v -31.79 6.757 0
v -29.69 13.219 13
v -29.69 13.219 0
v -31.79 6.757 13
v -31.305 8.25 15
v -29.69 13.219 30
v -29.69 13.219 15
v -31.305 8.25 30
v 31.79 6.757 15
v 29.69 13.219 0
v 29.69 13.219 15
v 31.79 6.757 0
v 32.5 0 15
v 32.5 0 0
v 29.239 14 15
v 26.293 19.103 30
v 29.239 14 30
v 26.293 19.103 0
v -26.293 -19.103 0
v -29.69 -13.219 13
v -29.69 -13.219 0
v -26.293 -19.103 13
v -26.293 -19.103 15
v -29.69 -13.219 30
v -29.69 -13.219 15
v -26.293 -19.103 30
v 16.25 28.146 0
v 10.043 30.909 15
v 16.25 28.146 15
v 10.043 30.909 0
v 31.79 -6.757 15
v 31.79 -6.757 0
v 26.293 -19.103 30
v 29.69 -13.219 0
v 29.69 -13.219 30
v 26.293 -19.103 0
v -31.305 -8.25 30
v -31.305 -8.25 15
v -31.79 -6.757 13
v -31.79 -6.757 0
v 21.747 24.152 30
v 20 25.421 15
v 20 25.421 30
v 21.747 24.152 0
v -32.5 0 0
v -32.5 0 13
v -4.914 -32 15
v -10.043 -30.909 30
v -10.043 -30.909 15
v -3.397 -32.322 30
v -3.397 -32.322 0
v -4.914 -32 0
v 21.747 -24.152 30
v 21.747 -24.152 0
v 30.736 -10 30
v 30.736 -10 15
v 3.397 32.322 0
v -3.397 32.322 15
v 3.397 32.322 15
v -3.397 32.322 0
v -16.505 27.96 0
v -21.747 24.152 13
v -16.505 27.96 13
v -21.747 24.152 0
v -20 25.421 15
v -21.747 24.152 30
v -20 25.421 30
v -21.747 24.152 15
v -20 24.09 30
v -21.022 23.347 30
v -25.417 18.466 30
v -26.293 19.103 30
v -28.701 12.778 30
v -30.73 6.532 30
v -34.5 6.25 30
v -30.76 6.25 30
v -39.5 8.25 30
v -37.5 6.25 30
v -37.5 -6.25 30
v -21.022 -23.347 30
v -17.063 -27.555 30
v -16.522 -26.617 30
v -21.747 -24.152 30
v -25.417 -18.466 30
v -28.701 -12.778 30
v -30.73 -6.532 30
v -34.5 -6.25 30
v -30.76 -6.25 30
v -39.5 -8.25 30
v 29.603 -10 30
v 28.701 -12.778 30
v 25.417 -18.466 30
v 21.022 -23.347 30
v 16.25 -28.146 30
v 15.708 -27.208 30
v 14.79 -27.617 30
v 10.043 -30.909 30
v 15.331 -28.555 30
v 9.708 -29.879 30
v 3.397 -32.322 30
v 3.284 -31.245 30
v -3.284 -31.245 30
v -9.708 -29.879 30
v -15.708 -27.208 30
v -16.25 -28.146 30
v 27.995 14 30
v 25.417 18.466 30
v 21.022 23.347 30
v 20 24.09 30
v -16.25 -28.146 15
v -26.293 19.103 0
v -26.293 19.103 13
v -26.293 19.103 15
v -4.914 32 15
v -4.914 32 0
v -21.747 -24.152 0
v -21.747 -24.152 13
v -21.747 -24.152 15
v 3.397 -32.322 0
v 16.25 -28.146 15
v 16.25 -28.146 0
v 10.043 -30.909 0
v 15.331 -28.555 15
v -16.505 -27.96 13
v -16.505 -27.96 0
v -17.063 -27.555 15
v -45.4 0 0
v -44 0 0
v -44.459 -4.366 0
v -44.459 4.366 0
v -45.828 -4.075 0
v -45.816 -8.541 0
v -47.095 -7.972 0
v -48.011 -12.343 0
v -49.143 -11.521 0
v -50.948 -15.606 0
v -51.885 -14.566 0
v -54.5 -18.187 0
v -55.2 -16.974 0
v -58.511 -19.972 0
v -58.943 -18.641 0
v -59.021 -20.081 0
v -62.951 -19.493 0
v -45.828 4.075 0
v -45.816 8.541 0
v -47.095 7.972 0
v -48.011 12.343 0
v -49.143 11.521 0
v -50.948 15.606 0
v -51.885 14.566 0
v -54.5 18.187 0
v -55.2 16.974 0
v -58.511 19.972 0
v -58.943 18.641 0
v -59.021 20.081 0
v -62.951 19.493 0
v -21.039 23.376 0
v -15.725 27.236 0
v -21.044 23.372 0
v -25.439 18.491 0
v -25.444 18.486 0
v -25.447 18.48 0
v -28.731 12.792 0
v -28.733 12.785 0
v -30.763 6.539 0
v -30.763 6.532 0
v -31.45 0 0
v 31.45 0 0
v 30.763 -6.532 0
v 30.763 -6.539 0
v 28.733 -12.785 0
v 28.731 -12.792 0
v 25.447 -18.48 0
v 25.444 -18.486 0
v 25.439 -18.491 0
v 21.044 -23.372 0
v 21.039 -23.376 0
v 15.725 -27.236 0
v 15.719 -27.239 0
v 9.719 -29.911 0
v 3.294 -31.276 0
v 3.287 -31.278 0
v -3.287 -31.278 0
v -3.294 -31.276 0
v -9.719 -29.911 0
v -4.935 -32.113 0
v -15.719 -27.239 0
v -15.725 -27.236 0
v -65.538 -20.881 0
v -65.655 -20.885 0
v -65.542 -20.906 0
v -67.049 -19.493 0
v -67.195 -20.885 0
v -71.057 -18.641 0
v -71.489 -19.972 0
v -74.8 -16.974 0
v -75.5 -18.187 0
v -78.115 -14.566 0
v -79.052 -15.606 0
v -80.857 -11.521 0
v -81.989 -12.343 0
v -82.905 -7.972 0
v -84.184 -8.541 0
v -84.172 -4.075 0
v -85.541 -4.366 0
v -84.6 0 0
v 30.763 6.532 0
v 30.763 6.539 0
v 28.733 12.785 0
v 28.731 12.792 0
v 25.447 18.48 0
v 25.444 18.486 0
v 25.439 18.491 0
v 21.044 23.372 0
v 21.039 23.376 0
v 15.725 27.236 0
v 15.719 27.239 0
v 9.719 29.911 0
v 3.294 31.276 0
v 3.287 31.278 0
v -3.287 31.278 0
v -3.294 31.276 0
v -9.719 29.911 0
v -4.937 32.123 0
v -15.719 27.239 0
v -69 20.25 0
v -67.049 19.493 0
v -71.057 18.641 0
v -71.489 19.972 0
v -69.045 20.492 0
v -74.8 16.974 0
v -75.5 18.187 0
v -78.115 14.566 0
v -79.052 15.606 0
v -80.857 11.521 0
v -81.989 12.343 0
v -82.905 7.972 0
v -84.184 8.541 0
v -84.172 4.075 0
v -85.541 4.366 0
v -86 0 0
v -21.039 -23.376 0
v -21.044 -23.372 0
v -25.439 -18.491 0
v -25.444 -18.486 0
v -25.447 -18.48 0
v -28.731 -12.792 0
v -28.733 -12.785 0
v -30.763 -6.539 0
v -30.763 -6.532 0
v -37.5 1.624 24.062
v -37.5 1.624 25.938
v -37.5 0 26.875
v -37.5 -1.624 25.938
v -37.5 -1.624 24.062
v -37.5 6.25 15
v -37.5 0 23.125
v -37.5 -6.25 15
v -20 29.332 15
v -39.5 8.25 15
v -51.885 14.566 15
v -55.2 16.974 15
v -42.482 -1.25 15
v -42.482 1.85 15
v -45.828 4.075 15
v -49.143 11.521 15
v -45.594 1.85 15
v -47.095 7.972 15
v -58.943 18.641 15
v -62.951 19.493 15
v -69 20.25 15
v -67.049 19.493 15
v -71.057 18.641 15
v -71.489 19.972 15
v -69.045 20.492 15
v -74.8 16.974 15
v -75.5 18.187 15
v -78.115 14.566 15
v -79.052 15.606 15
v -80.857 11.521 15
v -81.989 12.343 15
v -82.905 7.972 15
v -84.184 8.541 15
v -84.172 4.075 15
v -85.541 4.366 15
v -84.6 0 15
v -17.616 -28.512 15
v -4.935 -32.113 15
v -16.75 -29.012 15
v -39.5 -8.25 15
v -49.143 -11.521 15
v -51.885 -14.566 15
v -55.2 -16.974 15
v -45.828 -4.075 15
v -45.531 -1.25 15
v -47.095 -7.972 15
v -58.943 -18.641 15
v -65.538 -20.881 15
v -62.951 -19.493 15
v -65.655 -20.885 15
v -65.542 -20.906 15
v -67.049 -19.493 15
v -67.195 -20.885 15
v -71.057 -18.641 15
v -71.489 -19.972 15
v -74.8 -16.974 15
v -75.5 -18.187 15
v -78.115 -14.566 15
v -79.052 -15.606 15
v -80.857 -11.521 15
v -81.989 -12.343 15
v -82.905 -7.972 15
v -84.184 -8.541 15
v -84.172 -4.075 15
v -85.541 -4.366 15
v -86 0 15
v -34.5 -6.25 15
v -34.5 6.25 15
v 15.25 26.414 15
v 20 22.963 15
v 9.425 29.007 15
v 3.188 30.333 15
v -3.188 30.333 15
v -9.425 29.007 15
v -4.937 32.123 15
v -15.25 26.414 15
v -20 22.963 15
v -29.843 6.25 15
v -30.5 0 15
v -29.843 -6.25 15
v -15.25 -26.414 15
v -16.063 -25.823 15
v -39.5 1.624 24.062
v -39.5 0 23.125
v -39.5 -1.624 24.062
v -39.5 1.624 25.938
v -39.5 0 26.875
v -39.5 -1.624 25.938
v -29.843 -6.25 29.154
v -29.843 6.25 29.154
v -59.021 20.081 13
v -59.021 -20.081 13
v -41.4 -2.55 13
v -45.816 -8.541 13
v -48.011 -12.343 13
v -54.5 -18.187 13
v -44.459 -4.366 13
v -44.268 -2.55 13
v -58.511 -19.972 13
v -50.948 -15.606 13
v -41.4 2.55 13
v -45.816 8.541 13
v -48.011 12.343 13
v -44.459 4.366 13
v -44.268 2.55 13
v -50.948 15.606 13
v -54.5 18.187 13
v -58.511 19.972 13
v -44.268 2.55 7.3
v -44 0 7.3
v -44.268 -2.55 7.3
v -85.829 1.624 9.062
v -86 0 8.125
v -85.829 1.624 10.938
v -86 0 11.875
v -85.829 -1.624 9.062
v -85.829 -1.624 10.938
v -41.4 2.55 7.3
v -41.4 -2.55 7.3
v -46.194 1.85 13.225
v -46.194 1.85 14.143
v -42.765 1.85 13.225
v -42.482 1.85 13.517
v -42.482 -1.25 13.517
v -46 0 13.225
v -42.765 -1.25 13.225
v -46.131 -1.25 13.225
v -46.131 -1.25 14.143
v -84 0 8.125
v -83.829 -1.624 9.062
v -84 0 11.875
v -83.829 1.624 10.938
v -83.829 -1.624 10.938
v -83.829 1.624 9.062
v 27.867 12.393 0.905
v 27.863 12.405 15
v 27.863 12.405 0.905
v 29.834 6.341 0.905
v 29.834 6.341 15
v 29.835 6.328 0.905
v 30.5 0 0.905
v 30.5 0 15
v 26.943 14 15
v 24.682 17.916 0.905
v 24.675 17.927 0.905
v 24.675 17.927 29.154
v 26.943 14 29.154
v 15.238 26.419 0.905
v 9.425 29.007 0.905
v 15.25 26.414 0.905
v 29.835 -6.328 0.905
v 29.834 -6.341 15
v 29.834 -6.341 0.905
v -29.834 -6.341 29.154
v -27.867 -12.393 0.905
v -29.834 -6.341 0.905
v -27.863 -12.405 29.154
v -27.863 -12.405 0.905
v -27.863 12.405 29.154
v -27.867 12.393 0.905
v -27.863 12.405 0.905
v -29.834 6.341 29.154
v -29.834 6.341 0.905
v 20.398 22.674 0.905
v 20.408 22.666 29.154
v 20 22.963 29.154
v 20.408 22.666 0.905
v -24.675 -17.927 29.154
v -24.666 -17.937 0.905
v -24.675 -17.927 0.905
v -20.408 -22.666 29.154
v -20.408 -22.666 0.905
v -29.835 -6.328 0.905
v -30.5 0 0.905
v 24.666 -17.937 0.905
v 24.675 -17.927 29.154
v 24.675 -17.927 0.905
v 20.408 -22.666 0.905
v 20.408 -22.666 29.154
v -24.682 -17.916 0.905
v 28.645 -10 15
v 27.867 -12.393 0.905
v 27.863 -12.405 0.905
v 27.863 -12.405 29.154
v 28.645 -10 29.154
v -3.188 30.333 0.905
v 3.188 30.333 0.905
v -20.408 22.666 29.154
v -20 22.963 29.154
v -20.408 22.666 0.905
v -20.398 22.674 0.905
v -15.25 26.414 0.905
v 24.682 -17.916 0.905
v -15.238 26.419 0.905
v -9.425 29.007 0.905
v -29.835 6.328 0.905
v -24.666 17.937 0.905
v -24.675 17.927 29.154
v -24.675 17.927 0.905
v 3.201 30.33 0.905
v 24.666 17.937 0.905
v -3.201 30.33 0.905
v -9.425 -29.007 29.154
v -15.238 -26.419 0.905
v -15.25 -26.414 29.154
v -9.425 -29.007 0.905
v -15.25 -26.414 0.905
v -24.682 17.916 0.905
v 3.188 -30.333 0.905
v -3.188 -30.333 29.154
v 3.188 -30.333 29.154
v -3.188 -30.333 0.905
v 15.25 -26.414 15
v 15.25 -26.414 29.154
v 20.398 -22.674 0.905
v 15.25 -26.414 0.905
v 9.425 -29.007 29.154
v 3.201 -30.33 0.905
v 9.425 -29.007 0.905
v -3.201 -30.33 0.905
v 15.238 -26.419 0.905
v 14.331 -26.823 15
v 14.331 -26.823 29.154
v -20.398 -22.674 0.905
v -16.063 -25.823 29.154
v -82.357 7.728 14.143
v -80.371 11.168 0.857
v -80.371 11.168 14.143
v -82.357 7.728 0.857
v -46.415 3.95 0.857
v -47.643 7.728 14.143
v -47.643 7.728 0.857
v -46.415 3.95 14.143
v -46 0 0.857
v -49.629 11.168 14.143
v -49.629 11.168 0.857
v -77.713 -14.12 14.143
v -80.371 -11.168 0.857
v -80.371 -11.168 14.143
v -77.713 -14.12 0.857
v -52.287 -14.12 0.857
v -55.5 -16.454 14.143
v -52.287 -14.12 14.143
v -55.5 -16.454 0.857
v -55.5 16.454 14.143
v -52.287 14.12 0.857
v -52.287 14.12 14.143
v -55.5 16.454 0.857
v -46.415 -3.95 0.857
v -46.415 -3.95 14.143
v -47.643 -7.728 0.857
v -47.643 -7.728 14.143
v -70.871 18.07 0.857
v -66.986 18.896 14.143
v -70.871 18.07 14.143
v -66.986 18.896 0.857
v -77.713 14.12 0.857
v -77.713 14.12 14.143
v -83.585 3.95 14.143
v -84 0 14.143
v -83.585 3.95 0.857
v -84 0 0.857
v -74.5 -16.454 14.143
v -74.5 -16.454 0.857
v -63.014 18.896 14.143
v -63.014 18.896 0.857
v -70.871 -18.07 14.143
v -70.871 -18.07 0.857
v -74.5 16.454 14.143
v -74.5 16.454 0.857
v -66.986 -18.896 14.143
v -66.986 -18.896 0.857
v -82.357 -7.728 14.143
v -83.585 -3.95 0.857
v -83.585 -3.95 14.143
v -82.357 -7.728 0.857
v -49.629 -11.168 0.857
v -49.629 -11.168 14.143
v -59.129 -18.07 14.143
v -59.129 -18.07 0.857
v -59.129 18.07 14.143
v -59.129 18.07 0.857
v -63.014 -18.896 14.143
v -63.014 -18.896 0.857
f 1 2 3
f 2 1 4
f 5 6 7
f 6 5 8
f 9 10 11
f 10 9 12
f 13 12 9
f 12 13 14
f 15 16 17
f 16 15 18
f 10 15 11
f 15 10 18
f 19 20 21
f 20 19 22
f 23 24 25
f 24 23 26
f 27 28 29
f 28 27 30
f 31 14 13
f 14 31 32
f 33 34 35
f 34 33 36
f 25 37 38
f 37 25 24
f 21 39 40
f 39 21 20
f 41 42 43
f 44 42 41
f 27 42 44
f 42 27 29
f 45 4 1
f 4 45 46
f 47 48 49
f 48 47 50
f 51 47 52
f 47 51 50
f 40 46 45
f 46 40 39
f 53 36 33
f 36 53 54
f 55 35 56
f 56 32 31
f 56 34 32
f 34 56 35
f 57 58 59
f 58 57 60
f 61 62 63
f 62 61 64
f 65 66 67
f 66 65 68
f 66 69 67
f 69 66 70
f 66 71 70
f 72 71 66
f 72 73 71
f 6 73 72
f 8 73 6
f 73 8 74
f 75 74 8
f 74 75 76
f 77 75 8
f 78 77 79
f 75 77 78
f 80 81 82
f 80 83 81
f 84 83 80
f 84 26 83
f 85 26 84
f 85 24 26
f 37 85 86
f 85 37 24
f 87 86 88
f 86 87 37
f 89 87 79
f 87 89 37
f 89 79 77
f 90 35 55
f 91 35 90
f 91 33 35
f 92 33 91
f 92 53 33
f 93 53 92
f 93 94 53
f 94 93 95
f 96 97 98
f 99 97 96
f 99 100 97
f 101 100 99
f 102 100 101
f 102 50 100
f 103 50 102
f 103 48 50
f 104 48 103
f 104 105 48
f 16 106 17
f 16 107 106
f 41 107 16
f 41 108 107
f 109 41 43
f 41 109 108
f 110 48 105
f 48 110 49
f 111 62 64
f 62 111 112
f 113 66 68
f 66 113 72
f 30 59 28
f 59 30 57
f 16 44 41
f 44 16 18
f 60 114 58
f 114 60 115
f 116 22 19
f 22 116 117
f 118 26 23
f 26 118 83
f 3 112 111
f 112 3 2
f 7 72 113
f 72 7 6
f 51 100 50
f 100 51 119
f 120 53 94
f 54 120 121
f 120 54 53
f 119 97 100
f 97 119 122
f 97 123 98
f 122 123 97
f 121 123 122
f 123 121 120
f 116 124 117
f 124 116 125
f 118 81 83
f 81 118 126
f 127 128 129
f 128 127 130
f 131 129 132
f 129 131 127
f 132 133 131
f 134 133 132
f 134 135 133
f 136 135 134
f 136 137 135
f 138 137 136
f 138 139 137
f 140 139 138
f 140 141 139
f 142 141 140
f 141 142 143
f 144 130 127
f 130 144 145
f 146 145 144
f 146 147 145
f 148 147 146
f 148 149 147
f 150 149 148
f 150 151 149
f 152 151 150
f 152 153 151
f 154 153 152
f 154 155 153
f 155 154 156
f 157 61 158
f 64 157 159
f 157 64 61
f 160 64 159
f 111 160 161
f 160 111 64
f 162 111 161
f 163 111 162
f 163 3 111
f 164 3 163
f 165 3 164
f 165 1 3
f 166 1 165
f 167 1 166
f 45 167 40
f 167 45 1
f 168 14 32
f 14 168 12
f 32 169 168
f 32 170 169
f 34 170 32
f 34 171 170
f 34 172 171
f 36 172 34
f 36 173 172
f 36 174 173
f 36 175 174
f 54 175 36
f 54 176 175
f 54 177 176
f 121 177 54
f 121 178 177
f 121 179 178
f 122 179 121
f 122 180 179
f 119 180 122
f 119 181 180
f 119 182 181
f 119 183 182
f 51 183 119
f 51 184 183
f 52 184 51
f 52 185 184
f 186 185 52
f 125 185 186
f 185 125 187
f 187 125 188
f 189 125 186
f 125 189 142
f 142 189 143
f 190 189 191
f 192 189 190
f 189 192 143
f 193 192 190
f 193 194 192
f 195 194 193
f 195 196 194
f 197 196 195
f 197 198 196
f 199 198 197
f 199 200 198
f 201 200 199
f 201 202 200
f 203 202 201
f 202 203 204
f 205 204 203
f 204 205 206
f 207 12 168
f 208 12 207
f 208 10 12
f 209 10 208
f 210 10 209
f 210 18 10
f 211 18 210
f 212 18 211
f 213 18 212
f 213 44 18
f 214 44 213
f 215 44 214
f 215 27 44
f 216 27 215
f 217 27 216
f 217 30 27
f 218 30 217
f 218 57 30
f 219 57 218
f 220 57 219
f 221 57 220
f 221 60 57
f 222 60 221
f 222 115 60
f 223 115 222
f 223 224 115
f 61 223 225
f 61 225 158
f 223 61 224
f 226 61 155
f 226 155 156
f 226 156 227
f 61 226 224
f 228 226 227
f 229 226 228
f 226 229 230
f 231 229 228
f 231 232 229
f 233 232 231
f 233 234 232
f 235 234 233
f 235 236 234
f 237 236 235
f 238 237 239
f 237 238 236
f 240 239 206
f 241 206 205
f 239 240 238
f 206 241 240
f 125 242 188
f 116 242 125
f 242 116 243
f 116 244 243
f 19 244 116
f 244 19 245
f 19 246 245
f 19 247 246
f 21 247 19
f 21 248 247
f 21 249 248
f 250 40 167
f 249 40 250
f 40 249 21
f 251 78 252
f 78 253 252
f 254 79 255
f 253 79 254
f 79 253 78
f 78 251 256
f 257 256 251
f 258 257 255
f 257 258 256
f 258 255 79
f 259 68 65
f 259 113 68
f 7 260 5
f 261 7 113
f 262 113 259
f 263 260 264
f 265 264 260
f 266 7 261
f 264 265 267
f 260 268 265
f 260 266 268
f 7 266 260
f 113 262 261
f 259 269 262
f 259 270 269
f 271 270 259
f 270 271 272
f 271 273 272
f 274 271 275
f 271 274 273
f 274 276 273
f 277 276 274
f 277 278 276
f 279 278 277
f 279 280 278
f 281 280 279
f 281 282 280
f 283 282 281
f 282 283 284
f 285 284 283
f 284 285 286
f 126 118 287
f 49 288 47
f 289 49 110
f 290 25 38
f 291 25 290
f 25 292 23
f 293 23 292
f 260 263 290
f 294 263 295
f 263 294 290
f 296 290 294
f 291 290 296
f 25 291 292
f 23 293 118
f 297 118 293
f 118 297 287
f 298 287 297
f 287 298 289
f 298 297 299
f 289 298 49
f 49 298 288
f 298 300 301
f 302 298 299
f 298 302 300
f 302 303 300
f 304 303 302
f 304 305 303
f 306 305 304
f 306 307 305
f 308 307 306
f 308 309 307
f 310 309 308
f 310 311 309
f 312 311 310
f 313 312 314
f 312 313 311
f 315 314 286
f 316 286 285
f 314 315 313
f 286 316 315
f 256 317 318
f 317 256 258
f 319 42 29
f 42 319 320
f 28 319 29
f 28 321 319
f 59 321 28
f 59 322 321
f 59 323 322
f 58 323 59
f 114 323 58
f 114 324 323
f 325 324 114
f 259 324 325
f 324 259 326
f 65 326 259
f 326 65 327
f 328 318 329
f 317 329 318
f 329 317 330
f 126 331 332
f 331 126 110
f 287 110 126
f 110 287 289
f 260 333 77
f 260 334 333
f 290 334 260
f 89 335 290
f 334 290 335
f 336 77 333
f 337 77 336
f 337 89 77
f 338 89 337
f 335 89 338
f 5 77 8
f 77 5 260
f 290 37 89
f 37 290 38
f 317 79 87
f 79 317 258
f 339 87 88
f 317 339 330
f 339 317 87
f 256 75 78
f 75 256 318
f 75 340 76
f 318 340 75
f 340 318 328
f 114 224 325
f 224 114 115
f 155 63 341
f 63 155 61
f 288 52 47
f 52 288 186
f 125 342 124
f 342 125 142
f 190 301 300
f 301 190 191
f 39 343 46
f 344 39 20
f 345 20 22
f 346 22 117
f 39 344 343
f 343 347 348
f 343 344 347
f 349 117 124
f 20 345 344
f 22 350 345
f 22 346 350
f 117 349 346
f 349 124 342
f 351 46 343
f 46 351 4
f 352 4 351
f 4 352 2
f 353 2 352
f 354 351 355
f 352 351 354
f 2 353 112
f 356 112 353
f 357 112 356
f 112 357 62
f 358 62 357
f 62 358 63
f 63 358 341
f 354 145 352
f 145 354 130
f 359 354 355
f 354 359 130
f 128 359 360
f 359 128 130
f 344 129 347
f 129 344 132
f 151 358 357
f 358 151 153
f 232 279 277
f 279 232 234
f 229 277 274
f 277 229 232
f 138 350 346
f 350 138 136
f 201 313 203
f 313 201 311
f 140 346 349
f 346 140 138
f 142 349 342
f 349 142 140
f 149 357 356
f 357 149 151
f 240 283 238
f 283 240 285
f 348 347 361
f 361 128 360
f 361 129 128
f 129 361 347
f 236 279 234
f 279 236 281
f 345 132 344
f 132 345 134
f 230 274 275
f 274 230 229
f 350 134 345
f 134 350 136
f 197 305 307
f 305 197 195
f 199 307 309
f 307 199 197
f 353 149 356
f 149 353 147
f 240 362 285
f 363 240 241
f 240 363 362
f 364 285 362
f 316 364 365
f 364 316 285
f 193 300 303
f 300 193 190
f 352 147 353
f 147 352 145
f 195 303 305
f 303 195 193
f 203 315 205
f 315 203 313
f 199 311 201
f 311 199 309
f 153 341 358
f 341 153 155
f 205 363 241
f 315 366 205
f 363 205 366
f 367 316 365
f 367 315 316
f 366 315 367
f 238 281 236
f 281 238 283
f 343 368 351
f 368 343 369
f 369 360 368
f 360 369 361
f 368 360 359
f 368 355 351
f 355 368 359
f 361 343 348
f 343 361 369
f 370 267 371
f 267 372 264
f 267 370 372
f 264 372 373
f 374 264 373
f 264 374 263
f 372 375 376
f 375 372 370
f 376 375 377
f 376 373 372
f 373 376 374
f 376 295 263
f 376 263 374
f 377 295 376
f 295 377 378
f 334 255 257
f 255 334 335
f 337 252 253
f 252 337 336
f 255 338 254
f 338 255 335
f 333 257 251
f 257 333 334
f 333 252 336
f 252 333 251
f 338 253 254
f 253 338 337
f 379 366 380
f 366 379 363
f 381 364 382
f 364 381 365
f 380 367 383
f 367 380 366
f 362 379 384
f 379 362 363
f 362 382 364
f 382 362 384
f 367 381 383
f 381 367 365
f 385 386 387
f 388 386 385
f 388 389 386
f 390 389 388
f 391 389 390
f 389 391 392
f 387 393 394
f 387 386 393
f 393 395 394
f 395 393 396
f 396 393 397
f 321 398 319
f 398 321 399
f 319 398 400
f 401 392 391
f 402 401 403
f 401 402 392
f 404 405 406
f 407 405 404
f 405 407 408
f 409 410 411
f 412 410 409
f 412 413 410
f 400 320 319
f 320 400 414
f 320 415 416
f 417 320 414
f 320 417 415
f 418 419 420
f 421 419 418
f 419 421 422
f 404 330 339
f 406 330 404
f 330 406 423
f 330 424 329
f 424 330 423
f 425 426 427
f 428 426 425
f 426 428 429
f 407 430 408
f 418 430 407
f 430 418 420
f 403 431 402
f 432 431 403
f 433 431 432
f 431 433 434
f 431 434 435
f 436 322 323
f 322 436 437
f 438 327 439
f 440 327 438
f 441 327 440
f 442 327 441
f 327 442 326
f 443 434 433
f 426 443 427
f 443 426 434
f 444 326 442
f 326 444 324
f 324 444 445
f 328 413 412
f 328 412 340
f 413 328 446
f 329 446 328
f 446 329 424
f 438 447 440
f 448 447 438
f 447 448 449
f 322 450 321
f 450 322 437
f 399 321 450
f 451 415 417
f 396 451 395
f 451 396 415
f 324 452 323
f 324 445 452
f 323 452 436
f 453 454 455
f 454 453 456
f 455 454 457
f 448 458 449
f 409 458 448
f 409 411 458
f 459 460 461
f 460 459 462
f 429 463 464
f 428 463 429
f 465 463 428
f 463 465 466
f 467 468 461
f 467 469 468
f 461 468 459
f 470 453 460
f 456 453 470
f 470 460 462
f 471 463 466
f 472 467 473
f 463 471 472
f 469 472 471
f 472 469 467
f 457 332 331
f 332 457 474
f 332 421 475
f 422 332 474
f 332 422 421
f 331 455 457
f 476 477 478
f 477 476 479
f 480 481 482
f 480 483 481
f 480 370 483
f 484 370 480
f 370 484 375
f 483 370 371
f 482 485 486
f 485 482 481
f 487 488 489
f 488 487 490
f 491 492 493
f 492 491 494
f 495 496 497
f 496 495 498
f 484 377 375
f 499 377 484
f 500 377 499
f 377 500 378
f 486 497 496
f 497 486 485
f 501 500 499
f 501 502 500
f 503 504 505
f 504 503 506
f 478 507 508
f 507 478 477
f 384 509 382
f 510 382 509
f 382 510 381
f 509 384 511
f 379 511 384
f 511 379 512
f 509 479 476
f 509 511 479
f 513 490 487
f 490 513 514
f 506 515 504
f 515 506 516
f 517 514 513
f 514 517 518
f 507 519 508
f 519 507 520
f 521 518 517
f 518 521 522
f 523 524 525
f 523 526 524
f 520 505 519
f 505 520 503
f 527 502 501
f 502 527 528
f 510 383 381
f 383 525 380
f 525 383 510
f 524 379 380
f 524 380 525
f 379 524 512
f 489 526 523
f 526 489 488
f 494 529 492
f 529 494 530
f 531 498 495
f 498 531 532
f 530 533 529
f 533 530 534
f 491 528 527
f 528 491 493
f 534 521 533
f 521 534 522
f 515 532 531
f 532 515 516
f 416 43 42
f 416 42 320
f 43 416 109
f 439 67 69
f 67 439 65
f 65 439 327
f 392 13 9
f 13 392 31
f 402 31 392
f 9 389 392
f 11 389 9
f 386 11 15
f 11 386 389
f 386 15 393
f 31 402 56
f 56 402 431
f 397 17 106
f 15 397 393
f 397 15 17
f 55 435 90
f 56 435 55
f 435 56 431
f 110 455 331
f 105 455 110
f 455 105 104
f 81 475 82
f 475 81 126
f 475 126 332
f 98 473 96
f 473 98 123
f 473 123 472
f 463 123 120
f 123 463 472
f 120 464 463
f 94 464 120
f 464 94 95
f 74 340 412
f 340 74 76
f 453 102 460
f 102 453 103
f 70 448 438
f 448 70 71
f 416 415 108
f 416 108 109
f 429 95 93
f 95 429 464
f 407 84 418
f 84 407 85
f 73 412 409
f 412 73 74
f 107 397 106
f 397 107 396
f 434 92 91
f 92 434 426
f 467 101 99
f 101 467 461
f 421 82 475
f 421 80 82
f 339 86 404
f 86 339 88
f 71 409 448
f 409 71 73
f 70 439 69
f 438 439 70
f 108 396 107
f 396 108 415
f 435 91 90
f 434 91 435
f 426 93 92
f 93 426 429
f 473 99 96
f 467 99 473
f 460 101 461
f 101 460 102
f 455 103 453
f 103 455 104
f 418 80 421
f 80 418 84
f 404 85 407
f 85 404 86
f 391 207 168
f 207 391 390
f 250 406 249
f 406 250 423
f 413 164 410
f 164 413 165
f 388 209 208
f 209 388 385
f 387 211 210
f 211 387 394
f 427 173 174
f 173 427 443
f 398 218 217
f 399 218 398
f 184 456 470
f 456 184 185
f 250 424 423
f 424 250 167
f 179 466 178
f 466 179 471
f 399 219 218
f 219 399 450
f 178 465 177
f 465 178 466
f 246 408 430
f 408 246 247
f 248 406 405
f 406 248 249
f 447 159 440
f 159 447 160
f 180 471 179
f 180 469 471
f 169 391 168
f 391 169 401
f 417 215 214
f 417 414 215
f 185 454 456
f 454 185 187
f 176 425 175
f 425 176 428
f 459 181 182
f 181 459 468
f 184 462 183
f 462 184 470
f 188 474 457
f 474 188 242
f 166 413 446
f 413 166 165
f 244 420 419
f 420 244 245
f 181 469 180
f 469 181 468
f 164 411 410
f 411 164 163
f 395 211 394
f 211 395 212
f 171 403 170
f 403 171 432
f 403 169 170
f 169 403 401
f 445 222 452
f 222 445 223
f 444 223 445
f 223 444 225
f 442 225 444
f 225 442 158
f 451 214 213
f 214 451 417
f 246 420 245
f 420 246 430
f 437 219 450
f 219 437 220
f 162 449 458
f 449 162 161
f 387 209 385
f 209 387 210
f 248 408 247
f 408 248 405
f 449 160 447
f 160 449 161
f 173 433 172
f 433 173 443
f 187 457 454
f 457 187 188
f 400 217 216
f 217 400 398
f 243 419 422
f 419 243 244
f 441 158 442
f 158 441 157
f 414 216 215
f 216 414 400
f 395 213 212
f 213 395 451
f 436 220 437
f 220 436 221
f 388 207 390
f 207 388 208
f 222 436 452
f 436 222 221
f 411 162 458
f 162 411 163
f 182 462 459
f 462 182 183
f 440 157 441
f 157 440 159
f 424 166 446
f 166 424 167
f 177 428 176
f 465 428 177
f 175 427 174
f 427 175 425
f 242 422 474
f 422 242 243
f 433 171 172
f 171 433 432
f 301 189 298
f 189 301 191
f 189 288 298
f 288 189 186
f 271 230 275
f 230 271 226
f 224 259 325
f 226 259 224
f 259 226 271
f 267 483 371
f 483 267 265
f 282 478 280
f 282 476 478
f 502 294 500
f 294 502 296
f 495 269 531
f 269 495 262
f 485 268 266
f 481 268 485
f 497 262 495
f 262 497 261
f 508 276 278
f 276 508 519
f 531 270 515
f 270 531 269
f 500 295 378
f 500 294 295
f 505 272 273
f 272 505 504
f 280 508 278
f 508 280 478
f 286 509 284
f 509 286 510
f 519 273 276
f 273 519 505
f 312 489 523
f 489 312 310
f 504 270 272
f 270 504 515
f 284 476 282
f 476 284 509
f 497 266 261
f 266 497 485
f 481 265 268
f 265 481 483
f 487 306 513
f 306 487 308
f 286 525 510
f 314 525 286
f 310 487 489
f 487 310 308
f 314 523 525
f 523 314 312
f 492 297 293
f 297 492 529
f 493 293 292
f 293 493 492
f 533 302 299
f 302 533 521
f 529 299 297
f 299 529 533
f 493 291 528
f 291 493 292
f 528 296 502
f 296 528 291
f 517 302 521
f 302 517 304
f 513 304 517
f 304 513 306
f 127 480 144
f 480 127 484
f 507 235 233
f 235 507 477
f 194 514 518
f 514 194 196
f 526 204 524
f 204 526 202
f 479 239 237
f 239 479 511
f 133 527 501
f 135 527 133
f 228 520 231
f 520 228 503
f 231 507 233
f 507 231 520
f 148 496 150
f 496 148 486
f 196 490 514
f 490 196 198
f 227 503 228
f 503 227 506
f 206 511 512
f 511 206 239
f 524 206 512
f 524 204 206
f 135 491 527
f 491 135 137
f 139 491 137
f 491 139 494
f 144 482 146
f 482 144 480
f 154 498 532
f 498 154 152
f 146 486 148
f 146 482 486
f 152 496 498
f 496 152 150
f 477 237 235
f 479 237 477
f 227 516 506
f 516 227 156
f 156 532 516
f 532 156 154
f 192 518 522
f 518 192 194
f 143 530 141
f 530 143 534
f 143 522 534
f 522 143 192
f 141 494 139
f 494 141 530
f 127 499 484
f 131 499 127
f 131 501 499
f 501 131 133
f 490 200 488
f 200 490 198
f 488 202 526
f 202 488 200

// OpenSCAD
// file: geometry.scad
function distance(xy0, xy1) = sqrt(pow((xy1[0] - xy0[0]), 2)
                                   + pow((xy1[1] - xy1[1]), 2));
function center(xy0, xy1) = [(xy1[0]+xy0[0])/2, (xy1[1]+xy0[1])/2];
// file: notcher.scad
module tube(h, r, t) {
    difference() {
        cylinder(h=h, r=r);
        cylinder(h=h, r=r-t);
    }
}

module notcher(w, d, h) {
    scale([4/5,1,3/5]) {
        translate([-w,+h/2,-d]) {
	    rotate([90,0,0]) {
		difference() {
		    union() {
			minkowski() {
			    cube([w,h,d/2]);
			    translate([w/9,w/9,0]) cylinder(h=d/2, r=w/9);
			}
			translate([w,h+w/9,0]) cube([w*3/9,w/9,d]);
			translate([-w/9,h+w/9,0]) cube([w*3/9,w/9,d]);
		    }
		    translate([-w/9,h+w/9,0]) cylinder(h=d, r=w/9);
		    translate([w+w*3/9,h+w/9,0]) cylinder(h=d, r=w/9);
		}
	    }
        }
    }
}
// main file
mount_center=0;
mount_diameter=61;
mount_radius=mount_diameter/2;
thickness=2;
height=30;
mount_width=12.5;
mount_depth=7;

screw_hole_radius=3.75/2;

vacuum_diameter=38;
vacuum_radius=vacuum_diameter/2;
vacuum_center=65;

far_mount_peak = [0+thickness/2, mount_radius + thickness/2];
far_vacuum_peak = [-vacuum_center-thickness/2,
                   vacuum_radius + thickness/2];
near_mount_peak = [0+thickness/2, -(mount_radius + thickness/2)];
near_vacuum_peak = [-vacuum_center-thickness/2,
                    -(vacuum_radius + thickness/2)];
registration_x = 4.6;
registration_y = 3.1;
registration_z = 3.7;

include <notcher.scad>
include <geometry.scad>

difference() {
    union() {
        // big cylindar
        cylinder(height, r=mount_radius+thickness);
        // build our screw plate
        translate([-(mount_radius+mount_depth+thickness),
                   -(mount_width+(thickness*2))/2,
                      height/2])
            cube([thickness, mount_width+(thickness*2),
                  height/2]);
        // and the near wall
        translate([-(mount_radius+mount_depth+thickness),
                   -(mount_width/2)-thickness,
                   height/2])
            cube([mount_depth+thickness*2, thickness,
                  height/2]);
        // and the far wall
        translate([-(mount_radius+mount_depth+thickness),
                   (mount_width/2),
                   height/2])
            cube([mount_depth+thickness*2, thickness,
                  height/2]);
        // put some walls on it to hang the curtain from
        d = distance(far_mount_peak, far_vacuum_peak);
        c = center(far_mount_peak, far_vacuum_peak);
        rotate([0,0,mount_radius - vacuum_radius - thickness/2])
            translate([(far_vacuum_peak[0]+far_mount_peak[0])/2
                        -d/2, mount_radius, 0])
                cube([d,thickness,height/2]);

        d = distance(near_mount_peak, near_vacuum_peak);
        c = center(near_mount_peak, near_vacuum_peak);
        rotate([0,0,-(mount_radius-vacuum_radius-thickness/2)])
            translate([(near_vacuum_peak[0]
                        +near_mount_peak[0])/2-d/2,
                       -(mount_radius+thickness),0])
                cube([d,thickness,height/2]);

        // and a floor...
        translate([-vacuum_center,-mount_radius,
                   height/2-thickness])
            cube([vacuum_center,mount_diameter,thickness]);
        // make the vacuum hose mount
        translate([-vacuum_center, 0, 0])
            cylinder(height/2, r=vacuum_radius+thickness);
        // hide the back of our vacuum registration
        translate([-(vacuum_center-vacuum_radius),
                   -(registration_y/2+thickness/2),
                   height/2-registration_z-thickness*2])
            cube([registration_x,
                  registration_y+thickness,
                  registration_z+thickness]);
    }
    // put a screw hole starter in our screw plate
    #translate([-(mount_radius+mount_depth+thickness+1),
               0, height/2+10])
        rotate([0,90,0])
            cylinder(thickness+2, r=screw_hole_radius);

    // put a screw hole starter in our vacuum ring
    #translate([-(vacuum_center+vacuum_radius+thickness+1), 0, 10])
        rotate([0,90,0])
            cylinder(thickness+2, r=screw_hole_radius);
    // now cut our big holes
    translate([0,0,-height/2])
        cylinder(height*2, r=mount_radius);
    translate([-vacuum_center,0,-height/4])
        cylinder(height, r=vacuum_radius);

    // cut out where our main spindle support structure is
    #translate([-20, mount_radius-10, height/2])
        cube([40, 20, height]);
    // cut out our spindle mount clamp screw rail
    #translate([mount_radius-7, -10, height/2])
        cube([20, 24, height]);
    // cut out our mounting rail
    #translate([-(mount_radius+thickness*2),
               -(mount_width/2), height/2])
        cube([8, mount_width, height]);
    // add some cutouts to ease mounting
    #rotate(a=[0,0,-30]) {
        translate([-thickness/2,
                   -(mount_radius+thickness*3/2),
                   height/2])
            cube([1,thickness*2,height/2]);
    }
    #rotate(a=[0,0,30]) {
        translate([-thickness/2,
                   -(mount_radius+thickness*3/2),
                   height/2])
            cube([1,thickness*2,height/2]);
    }
    // also bevel the edges of the mounting hole
    #translate([0,0,thickness/2])
        cylinder(h=height, r=mount_radius+thickness, r1=0);
    translate([0,0,-thickness/2])
        cylinder(h=height, r0=0, r1=mount_radius+thickness);

    // and trim the flared sides of our floor off.
    #translate([-(vacuum_center+thickness*2),
               -(vacuum_radius*2+thickness*25/32),0])
        rotate([0,0,-(mount_radius-vacuum_radius-thickness/2)])
            cube([distance(near_mount_peak, near_vacuum_peak)
                  +thickness*2, vacuum_radius, height]);
    #translate([-(vacuum_center+thickness*2),
               (vacuum_radius+thickness*20/32),0])
        rotate([0,0,(mount_radius-vacuum_radius-thickness/2)])
            cube([distance(far_mount_peak, far_vacuum_peak)
                  +thickness*2, vacuum_radius, height]);

    // notch out registration on the vaccum tube holder
    translate([-(vacuum_center-vacuum_radius-2.7),
               0,height/2+0.07])
        notcher(registration_x, registration_y, registration_z);

    // and bevel its edge just a bit
    #translate([-vacuum_center, 0, -height/2+thickness])
        cylinder(h=height, r=vacuum_radius+thickness, r1=0);
    #translate([-vacuum_center, 0, -thickness])
        cylinder(h=height, r=0, r1=vacuum_radius+thickness);
}
